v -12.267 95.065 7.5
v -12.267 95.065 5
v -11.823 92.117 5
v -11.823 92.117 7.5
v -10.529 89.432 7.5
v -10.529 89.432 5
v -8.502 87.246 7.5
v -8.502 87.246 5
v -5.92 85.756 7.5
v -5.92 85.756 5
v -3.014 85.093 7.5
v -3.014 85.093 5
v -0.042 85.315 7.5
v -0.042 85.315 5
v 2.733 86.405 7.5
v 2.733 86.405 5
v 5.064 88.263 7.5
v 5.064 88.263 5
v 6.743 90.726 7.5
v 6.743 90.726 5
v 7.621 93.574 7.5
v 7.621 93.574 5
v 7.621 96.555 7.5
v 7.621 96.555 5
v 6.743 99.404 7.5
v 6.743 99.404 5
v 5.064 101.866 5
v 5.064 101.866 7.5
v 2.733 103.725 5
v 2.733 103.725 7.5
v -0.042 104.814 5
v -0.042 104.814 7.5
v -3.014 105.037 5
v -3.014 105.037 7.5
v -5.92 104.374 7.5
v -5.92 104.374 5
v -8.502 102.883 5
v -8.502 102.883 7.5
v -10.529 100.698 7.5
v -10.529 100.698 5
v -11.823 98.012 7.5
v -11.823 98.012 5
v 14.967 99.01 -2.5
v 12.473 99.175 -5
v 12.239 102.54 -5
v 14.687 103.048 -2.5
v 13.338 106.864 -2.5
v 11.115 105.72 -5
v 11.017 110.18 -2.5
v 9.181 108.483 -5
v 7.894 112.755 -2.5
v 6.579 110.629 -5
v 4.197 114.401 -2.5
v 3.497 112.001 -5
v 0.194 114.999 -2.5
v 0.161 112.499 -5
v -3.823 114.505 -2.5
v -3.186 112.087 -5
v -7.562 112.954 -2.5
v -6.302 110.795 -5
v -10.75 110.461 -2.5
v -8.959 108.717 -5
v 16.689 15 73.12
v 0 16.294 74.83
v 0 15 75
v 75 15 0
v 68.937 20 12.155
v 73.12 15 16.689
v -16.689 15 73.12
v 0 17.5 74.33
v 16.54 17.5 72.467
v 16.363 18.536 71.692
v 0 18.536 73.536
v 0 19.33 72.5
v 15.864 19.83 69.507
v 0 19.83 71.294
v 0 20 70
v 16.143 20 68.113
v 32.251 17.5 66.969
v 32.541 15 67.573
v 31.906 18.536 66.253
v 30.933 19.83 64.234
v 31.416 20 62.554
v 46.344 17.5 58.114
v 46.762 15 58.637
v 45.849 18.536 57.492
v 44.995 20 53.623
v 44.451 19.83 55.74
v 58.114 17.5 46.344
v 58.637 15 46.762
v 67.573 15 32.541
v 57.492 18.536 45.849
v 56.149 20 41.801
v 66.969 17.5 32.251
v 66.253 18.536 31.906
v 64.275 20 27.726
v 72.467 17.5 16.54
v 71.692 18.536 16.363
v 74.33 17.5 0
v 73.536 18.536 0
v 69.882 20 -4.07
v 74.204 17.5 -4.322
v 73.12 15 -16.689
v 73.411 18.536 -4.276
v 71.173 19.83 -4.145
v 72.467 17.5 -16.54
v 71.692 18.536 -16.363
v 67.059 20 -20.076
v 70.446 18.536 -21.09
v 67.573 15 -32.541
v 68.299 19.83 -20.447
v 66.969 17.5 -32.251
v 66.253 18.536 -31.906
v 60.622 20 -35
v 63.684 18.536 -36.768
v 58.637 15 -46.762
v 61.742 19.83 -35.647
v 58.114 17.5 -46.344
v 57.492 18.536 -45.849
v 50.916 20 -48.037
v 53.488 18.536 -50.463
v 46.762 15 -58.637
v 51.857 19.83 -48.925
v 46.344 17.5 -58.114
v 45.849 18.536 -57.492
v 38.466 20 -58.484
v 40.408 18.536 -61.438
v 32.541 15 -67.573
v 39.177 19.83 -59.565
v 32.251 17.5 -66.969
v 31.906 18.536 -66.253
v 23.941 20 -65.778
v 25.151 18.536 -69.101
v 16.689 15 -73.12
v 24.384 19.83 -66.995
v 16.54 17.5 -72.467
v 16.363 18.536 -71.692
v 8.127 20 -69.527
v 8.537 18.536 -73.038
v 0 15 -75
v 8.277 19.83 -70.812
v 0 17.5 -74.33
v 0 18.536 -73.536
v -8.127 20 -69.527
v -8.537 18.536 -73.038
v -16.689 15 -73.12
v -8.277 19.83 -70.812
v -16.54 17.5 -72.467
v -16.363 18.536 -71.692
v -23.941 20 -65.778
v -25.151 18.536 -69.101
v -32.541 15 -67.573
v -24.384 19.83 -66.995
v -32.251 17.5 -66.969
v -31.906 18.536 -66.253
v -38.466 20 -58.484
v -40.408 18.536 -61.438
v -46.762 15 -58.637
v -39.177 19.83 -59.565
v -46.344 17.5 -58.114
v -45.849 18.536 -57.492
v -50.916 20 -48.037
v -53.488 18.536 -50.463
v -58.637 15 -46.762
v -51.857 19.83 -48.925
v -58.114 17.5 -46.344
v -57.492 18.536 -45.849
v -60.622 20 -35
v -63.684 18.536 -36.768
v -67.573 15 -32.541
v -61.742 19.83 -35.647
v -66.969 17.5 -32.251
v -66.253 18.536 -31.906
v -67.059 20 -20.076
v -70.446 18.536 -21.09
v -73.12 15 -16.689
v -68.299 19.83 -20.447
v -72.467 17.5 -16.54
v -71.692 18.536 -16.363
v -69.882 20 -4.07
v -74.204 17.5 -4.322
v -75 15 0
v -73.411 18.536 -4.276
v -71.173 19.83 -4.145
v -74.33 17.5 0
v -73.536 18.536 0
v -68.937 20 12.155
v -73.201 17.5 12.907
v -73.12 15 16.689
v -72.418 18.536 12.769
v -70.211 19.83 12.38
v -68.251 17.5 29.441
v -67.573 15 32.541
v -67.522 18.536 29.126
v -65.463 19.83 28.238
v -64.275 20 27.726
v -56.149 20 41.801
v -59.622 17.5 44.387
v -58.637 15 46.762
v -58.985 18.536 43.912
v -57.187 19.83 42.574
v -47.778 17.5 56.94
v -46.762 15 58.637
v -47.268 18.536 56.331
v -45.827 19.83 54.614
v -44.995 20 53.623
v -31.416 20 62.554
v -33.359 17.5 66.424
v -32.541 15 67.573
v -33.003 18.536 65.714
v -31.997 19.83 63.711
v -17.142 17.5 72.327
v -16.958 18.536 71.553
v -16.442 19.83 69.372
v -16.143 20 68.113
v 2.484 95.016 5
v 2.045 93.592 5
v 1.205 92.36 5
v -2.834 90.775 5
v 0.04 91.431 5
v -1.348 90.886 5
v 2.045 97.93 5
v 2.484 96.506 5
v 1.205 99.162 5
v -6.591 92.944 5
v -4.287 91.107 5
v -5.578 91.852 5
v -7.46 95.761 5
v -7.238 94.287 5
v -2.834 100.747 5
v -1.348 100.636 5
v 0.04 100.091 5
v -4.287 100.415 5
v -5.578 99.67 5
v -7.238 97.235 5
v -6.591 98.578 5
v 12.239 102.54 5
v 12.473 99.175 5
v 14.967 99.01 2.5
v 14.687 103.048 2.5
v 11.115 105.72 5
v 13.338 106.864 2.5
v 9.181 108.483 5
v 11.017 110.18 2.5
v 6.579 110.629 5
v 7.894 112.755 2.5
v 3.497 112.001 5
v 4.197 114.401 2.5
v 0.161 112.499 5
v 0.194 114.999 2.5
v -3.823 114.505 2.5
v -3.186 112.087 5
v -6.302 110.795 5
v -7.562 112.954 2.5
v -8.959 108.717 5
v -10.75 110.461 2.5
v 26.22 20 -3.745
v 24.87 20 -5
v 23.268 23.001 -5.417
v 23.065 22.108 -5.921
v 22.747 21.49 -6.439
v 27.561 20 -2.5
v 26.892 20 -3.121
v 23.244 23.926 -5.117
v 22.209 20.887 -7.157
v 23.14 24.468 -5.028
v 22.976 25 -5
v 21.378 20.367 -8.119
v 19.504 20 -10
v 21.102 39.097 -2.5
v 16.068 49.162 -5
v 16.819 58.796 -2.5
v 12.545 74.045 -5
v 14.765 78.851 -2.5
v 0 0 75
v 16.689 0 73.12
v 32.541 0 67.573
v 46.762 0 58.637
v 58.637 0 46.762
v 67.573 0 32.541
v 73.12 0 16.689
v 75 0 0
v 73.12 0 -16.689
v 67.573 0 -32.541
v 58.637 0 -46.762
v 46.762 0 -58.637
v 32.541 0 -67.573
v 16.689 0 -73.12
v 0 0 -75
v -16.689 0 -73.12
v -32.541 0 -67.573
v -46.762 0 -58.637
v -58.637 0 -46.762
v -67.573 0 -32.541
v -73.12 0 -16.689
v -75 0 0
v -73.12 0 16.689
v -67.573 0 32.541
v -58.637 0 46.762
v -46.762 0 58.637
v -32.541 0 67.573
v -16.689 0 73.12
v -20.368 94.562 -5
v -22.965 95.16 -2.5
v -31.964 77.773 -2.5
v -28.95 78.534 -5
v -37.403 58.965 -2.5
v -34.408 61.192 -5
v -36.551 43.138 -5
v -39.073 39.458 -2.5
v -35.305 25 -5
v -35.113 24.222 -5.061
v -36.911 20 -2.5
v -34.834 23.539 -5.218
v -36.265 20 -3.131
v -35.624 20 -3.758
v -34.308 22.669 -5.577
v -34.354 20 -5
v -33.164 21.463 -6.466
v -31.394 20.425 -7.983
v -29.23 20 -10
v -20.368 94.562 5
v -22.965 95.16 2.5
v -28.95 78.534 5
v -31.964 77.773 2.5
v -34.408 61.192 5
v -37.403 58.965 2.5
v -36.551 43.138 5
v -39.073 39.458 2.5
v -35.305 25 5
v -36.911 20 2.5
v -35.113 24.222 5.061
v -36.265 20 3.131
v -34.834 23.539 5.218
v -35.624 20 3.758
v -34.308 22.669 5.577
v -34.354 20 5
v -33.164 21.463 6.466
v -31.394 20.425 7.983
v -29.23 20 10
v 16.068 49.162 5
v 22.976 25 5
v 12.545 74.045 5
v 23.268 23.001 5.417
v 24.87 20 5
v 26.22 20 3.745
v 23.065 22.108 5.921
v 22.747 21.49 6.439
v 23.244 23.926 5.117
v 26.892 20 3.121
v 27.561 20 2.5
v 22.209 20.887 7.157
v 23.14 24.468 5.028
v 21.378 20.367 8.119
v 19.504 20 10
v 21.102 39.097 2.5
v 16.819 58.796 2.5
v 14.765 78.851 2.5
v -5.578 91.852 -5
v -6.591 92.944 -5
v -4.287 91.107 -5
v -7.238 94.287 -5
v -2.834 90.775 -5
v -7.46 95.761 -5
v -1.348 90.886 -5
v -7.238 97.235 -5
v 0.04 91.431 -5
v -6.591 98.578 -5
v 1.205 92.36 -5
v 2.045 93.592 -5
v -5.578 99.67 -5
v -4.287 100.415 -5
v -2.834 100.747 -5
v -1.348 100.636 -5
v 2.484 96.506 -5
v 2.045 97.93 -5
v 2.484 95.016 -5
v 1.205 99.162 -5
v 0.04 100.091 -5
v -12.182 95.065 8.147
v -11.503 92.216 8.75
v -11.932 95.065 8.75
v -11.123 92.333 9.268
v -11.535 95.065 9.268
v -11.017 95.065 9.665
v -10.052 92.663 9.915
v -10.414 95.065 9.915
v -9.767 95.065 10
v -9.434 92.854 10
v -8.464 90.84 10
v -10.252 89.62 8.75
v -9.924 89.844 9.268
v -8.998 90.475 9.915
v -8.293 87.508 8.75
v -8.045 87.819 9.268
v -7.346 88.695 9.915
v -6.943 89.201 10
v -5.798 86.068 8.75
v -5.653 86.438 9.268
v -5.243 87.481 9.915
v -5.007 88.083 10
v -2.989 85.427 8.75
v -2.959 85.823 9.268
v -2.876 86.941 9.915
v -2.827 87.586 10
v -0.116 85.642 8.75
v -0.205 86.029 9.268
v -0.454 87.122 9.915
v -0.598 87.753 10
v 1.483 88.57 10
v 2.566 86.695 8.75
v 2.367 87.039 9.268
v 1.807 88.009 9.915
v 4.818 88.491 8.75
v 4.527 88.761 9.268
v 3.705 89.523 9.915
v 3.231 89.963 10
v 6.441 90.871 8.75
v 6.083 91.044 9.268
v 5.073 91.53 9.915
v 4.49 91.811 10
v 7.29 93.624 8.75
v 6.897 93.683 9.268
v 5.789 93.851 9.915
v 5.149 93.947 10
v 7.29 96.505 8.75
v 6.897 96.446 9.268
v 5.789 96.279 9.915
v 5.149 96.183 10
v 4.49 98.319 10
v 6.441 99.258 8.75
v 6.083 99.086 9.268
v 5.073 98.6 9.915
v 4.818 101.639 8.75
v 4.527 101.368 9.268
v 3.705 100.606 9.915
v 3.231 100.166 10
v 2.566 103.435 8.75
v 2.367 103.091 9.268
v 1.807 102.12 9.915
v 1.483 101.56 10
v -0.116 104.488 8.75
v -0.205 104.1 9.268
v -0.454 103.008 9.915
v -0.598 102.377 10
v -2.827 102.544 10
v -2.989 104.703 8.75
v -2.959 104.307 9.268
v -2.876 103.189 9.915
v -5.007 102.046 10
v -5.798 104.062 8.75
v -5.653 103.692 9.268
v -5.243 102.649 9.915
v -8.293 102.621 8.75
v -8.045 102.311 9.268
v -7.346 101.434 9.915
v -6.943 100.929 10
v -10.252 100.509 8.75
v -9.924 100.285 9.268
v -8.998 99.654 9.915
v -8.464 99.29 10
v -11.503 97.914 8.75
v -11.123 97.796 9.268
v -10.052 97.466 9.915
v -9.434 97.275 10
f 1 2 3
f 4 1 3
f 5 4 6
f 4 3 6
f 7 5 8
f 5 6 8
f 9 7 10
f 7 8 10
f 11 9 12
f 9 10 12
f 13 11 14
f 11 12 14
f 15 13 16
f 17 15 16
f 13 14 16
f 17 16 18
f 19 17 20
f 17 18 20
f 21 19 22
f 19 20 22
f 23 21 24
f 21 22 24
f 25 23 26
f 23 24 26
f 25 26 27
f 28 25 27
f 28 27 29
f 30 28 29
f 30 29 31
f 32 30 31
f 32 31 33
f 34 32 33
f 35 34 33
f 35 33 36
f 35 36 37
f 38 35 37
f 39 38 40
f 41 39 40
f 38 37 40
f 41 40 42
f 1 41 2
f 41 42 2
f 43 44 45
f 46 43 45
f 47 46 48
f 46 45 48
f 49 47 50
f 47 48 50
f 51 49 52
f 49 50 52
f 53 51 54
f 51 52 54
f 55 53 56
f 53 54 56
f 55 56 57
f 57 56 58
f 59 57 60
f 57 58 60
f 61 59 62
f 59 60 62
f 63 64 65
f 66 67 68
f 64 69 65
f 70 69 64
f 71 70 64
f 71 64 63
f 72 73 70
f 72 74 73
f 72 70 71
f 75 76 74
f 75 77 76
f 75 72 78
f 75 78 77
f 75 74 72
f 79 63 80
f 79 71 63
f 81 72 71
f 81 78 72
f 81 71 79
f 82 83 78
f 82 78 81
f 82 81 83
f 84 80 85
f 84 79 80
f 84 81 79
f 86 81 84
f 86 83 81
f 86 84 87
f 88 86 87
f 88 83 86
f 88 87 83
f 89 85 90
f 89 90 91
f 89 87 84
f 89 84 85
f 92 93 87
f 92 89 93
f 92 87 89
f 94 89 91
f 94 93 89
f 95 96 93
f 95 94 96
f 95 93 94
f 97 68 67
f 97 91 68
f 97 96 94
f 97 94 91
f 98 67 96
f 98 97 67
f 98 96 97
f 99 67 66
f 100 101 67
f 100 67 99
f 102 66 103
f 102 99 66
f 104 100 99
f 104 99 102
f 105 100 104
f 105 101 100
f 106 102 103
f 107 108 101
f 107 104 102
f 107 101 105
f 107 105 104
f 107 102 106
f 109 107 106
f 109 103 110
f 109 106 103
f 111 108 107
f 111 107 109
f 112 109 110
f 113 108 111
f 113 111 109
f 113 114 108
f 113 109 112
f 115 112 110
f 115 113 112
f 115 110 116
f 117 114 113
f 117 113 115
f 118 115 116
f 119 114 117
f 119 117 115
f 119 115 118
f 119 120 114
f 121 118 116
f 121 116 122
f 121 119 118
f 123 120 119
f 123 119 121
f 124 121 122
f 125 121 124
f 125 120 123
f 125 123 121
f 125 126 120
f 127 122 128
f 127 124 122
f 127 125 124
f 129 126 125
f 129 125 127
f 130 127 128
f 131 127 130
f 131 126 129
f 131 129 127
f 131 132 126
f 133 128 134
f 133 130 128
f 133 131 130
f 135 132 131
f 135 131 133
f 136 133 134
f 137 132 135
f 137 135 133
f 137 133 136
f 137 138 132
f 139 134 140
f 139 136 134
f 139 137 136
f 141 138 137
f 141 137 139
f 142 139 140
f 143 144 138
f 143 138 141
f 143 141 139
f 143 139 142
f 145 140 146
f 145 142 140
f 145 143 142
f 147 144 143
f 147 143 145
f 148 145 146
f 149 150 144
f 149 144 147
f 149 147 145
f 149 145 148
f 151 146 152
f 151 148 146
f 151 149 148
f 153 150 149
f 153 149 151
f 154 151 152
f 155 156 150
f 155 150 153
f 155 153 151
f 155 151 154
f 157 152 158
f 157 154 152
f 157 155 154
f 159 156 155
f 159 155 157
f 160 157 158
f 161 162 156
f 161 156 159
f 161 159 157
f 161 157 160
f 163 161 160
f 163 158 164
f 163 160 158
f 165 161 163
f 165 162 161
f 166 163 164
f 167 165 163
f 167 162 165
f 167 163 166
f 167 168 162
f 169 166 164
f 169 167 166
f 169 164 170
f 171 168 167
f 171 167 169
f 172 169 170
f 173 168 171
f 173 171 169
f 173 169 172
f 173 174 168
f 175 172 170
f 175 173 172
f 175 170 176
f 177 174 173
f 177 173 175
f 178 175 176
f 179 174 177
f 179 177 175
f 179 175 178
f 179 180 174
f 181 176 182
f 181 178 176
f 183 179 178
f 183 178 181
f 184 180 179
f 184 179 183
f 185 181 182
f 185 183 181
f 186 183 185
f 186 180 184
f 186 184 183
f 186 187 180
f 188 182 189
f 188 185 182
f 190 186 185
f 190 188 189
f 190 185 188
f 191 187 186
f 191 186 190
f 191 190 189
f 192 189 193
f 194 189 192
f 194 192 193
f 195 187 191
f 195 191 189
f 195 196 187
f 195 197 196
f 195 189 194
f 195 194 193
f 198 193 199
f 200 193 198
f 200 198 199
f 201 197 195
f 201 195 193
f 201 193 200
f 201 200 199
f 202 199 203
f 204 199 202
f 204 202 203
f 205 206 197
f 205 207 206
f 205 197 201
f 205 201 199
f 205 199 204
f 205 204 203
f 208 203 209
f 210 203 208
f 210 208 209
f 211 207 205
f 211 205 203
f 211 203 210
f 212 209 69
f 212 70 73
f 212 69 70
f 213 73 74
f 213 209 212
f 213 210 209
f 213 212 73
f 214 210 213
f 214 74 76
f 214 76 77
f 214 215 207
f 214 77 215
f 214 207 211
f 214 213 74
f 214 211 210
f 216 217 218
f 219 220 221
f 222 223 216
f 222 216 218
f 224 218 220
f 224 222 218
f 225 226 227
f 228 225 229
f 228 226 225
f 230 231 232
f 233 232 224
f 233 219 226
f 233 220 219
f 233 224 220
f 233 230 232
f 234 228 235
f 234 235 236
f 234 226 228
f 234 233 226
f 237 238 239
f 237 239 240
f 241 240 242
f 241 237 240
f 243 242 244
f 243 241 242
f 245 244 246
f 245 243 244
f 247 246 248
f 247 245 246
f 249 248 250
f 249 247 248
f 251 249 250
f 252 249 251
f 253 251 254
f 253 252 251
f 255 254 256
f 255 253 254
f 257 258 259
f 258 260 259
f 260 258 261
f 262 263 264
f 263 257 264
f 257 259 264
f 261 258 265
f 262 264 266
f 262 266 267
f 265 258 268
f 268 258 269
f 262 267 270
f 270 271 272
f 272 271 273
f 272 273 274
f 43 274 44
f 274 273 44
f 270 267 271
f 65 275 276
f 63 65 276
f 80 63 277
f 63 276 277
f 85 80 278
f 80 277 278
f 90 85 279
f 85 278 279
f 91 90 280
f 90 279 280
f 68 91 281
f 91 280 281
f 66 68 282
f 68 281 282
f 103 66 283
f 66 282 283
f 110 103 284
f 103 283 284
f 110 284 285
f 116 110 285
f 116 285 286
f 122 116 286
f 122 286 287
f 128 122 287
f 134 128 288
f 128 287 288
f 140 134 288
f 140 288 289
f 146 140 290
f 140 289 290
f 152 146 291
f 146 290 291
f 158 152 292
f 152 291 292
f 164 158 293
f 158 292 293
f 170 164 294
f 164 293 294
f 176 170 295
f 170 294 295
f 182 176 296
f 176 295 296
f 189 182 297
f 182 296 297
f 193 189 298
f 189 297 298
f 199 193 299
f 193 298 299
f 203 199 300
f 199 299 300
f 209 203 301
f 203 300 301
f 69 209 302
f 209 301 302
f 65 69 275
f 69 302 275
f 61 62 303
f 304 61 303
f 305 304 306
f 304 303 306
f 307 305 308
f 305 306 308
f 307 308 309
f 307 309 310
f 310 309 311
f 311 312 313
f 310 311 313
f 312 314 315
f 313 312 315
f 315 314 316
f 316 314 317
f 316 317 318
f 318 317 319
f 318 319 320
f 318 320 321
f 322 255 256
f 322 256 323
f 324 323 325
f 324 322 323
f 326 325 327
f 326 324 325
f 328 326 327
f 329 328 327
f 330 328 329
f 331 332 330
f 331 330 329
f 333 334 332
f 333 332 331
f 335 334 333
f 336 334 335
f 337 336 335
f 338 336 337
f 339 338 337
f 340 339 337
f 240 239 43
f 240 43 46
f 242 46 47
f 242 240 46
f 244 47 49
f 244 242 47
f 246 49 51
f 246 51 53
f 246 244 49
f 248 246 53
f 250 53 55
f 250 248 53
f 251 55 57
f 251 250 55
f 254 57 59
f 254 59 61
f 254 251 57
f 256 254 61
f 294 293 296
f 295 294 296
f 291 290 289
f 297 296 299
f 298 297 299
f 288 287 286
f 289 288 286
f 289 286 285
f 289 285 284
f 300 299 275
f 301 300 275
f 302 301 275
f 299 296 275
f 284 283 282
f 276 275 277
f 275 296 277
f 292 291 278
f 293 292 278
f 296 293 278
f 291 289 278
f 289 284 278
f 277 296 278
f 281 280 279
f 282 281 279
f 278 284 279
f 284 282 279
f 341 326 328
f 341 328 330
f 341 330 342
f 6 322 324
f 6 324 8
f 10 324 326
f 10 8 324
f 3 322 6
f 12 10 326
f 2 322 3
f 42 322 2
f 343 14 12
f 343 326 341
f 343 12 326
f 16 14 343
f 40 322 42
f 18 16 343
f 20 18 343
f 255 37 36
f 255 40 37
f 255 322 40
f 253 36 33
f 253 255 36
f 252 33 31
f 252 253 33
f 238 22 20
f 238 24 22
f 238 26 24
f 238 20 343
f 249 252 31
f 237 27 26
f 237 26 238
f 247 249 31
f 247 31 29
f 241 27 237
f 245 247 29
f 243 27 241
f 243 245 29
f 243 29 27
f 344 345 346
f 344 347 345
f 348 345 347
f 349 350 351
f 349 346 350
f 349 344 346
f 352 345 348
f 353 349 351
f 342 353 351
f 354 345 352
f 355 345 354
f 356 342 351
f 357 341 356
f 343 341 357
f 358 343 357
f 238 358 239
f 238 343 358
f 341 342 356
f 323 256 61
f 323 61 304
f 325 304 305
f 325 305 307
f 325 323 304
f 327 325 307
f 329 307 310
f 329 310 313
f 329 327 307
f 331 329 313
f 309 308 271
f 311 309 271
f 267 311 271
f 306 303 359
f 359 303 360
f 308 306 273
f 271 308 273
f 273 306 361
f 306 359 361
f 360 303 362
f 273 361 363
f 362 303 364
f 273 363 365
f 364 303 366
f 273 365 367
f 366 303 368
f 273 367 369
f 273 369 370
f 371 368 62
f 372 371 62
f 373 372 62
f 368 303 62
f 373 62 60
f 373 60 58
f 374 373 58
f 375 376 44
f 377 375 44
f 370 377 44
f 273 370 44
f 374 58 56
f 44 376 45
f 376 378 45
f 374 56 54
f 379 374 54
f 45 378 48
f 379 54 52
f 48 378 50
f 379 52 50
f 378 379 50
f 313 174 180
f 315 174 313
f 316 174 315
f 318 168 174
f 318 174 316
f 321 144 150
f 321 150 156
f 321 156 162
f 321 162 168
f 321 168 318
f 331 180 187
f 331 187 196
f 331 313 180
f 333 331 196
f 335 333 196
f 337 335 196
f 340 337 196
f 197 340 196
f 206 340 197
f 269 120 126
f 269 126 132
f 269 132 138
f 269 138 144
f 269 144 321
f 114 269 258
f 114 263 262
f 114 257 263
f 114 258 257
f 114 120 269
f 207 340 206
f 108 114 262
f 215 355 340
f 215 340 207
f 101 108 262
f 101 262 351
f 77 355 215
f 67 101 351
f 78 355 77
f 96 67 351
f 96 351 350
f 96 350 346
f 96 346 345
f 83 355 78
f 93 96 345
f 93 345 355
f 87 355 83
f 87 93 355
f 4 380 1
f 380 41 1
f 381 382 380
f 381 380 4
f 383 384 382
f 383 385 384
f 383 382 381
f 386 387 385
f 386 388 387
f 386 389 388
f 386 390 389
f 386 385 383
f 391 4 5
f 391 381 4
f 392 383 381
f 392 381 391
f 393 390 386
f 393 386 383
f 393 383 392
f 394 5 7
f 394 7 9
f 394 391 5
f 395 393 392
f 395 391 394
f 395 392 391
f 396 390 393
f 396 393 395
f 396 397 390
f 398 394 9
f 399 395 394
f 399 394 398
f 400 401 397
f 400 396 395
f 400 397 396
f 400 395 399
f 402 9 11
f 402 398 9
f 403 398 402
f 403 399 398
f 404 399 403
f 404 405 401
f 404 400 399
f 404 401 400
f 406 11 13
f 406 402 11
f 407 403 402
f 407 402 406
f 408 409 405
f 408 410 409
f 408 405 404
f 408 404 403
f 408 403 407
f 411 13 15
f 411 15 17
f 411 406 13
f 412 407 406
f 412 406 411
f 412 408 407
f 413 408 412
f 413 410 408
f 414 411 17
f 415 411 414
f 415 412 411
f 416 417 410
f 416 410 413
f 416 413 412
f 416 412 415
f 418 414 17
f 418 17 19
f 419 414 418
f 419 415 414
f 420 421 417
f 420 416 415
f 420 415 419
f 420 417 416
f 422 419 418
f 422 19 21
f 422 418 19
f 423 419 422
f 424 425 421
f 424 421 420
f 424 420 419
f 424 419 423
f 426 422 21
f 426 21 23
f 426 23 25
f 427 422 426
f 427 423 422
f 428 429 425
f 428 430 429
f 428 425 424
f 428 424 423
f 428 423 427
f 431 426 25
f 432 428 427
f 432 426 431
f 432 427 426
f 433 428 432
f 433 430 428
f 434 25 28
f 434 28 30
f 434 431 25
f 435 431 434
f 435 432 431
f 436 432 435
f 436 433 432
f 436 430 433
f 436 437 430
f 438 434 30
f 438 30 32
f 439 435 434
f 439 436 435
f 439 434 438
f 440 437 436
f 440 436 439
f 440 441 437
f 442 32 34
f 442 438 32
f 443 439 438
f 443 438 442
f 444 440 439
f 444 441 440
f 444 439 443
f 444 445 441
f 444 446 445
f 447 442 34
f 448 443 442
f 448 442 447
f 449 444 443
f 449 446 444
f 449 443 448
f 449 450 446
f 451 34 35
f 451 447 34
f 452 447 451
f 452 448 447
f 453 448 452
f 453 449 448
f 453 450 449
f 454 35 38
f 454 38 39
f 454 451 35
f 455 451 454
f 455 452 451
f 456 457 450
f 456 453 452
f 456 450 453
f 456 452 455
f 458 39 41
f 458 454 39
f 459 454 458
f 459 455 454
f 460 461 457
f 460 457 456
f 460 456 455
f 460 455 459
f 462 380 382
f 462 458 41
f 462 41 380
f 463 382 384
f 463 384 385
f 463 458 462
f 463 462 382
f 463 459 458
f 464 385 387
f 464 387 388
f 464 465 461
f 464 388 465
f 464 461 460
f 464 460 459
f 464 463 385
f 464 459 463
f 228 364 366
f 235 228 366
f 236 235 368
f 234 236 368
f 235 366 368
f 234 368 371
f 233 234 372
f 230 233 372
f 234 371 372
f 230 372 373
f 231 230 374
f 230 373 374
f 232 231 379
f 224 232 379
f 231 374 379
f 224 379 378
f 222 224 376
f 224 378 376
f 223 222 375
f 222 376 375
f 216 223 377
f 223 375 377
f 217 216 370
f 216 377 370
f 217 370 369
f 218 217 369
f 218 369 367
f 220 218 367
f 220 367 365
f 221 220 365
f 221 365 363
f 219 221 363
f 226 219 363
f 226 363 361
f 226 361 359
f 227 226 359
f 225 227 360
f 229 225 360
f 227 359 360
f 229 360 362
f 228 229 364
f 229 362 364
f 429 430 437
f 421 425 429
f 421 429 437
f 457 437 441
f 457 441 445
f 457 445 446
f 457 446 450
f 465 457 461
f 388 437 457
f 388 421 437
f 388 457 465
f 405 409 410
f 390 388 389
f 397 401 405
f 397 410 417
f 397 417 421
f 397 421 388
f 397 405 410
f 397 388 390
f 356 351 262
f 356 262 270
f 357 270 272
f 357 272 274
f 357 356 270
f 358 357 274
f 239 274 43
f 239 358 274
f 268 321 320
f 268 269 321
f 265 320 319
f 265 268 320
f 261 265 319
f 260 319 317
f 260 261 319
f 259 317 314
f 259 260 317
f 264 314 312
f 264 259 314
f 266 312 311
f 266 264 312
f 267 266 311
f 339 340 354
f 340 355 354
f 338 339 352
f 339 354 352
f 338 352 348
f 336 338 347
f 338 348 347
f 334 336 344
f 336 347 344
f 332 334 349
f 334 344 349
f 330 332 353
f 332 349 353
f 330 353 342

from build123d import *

# Parameters (mm, degrees)
SKETCH1_R           = 75
BOSS_EXTRUDE1_DEPTH = 20
FILLET1_R           = 5
BOSS_EXTRUDE2_DEPTH = 5
CHAMFER2_SIZE       = 2.5
CHAMFER3_SIZE       = 2.5
FILLET2_R           = 5
SKETCH3_R           = 10
BOSS_EXTRUDE4_DEPTH = 5
FILLET5_R           = 2.5
SKETCH5_R           = 5
CUT_EXTRUDE4_DEPTH  = 10


with BuildPart() as part:
    # Sketch1 → Boss-Extrude1 (new body)
    with BuildSketch(Plane(origin=(0, 0, 0), x_dir=(1, 0, 0), z_dir=(0, 1, 0))):
        with Locations(Location((0, 0, 0), (0, 0, 270))):
            Circle(SKETCH1_R)
    extrude(amount=BOSS_EXTRUDE1_DEPTH)

    # Fillet1
    fillet1_edges = [part.edges().sort_by_distance(p)[0] for p in [
        (0, 20, -75),
    ]]
    fillet(fillet1_edges, radius=FILLET1_R)

    # Sketch2 → Boss-Extrude2 (add, symmetric)
    with BuildSketch(Plane.XY):
        with BuildLine():
            Line((-35, 12.444541462), (30, 12.444541462))
            Line((30, 12.444541462), (30, 14.22534194))
            ThreePointArc((30, 14.22534194), (17.339153051, 55.705537473), (14.967295478, 99.010017132))
            ThreePointArc((14.967295478, 99.010017132), (6.101321608, 113.703060776), (-10.750360925, 110.460867076))
            ThreePointArc((-10.750360925, 110.460867076), (-36.154540949, 64.738072262), (-35, 12.444541462))
        make_face()
    extrude(amount=BOSS_EXTRUDE2_DEPTH, both=True)

    # Chamfer2
    chamfer2_edges = [part.edges().sort_by_distance(p)[0] for p in [
        (16.818841315, 58.796417799, 5),
        (6.101321608, 113.703060776, 5),
        (-35.144979175, 68.502452567, 5),
    ]]
    chamfer(chamfer2_edges, length=CHAMFER2_SIZE)

    # Chamfer3
    chamfer3_edges = [part.edges().sort_by_distance(p)[0] for p in [
        (-35.144979175, 68.502452567, -5),
        (16.818841315, 58.796417799, -5),
        (6.101321608, 113.703060776, -5),
    ]]
    chamfer(chamfer3_edges, length=CHAMFER3_SIZE)

    # Fillet2
    fillet2_edges = [part.edges().sort_by_distance(p)[0] for p in [
        (-4.741993221, 20, 5),
        (-4.741993221, 20, -5),
    ]]
    fillet(fillet2_edges, radius=FILLET2_R)

    # Sketch3 → Boss-Extrude4 (add)
    with BuildSketch(Plane.XY.offset(5)):
        with Locations(Location((-2.266839378, 95.064766839, 0), (0, 0, 180))):
            Circle(SKETCH3_R)
    extrude(amount=BOSS_EXTRUDE4_DEPTH)

    # Fillet5
    fillet5_edges = [part.edges().sort_by_distance(p)[0] for p in [
        (7.733160622, 95.064766839, 10),
    ]]
    fillet(fillet5_edges, radius=FILLET5_R)

    # Sketch5 → Cut-Extrude4 (cut)
    with BuildSketch(Plane(origin=(0, 0, -5), x_dir=(-1, 0, 0), z_dir=(0, 0, -1))):
        with Locations((2.460107282, 95.761056281)):
            Circle(SKETCH5_R)
    extrude(amount=-CUT_EXTRUDE4_DEPTH, mode=Mode.SUBTRACT)


solid = part.part
